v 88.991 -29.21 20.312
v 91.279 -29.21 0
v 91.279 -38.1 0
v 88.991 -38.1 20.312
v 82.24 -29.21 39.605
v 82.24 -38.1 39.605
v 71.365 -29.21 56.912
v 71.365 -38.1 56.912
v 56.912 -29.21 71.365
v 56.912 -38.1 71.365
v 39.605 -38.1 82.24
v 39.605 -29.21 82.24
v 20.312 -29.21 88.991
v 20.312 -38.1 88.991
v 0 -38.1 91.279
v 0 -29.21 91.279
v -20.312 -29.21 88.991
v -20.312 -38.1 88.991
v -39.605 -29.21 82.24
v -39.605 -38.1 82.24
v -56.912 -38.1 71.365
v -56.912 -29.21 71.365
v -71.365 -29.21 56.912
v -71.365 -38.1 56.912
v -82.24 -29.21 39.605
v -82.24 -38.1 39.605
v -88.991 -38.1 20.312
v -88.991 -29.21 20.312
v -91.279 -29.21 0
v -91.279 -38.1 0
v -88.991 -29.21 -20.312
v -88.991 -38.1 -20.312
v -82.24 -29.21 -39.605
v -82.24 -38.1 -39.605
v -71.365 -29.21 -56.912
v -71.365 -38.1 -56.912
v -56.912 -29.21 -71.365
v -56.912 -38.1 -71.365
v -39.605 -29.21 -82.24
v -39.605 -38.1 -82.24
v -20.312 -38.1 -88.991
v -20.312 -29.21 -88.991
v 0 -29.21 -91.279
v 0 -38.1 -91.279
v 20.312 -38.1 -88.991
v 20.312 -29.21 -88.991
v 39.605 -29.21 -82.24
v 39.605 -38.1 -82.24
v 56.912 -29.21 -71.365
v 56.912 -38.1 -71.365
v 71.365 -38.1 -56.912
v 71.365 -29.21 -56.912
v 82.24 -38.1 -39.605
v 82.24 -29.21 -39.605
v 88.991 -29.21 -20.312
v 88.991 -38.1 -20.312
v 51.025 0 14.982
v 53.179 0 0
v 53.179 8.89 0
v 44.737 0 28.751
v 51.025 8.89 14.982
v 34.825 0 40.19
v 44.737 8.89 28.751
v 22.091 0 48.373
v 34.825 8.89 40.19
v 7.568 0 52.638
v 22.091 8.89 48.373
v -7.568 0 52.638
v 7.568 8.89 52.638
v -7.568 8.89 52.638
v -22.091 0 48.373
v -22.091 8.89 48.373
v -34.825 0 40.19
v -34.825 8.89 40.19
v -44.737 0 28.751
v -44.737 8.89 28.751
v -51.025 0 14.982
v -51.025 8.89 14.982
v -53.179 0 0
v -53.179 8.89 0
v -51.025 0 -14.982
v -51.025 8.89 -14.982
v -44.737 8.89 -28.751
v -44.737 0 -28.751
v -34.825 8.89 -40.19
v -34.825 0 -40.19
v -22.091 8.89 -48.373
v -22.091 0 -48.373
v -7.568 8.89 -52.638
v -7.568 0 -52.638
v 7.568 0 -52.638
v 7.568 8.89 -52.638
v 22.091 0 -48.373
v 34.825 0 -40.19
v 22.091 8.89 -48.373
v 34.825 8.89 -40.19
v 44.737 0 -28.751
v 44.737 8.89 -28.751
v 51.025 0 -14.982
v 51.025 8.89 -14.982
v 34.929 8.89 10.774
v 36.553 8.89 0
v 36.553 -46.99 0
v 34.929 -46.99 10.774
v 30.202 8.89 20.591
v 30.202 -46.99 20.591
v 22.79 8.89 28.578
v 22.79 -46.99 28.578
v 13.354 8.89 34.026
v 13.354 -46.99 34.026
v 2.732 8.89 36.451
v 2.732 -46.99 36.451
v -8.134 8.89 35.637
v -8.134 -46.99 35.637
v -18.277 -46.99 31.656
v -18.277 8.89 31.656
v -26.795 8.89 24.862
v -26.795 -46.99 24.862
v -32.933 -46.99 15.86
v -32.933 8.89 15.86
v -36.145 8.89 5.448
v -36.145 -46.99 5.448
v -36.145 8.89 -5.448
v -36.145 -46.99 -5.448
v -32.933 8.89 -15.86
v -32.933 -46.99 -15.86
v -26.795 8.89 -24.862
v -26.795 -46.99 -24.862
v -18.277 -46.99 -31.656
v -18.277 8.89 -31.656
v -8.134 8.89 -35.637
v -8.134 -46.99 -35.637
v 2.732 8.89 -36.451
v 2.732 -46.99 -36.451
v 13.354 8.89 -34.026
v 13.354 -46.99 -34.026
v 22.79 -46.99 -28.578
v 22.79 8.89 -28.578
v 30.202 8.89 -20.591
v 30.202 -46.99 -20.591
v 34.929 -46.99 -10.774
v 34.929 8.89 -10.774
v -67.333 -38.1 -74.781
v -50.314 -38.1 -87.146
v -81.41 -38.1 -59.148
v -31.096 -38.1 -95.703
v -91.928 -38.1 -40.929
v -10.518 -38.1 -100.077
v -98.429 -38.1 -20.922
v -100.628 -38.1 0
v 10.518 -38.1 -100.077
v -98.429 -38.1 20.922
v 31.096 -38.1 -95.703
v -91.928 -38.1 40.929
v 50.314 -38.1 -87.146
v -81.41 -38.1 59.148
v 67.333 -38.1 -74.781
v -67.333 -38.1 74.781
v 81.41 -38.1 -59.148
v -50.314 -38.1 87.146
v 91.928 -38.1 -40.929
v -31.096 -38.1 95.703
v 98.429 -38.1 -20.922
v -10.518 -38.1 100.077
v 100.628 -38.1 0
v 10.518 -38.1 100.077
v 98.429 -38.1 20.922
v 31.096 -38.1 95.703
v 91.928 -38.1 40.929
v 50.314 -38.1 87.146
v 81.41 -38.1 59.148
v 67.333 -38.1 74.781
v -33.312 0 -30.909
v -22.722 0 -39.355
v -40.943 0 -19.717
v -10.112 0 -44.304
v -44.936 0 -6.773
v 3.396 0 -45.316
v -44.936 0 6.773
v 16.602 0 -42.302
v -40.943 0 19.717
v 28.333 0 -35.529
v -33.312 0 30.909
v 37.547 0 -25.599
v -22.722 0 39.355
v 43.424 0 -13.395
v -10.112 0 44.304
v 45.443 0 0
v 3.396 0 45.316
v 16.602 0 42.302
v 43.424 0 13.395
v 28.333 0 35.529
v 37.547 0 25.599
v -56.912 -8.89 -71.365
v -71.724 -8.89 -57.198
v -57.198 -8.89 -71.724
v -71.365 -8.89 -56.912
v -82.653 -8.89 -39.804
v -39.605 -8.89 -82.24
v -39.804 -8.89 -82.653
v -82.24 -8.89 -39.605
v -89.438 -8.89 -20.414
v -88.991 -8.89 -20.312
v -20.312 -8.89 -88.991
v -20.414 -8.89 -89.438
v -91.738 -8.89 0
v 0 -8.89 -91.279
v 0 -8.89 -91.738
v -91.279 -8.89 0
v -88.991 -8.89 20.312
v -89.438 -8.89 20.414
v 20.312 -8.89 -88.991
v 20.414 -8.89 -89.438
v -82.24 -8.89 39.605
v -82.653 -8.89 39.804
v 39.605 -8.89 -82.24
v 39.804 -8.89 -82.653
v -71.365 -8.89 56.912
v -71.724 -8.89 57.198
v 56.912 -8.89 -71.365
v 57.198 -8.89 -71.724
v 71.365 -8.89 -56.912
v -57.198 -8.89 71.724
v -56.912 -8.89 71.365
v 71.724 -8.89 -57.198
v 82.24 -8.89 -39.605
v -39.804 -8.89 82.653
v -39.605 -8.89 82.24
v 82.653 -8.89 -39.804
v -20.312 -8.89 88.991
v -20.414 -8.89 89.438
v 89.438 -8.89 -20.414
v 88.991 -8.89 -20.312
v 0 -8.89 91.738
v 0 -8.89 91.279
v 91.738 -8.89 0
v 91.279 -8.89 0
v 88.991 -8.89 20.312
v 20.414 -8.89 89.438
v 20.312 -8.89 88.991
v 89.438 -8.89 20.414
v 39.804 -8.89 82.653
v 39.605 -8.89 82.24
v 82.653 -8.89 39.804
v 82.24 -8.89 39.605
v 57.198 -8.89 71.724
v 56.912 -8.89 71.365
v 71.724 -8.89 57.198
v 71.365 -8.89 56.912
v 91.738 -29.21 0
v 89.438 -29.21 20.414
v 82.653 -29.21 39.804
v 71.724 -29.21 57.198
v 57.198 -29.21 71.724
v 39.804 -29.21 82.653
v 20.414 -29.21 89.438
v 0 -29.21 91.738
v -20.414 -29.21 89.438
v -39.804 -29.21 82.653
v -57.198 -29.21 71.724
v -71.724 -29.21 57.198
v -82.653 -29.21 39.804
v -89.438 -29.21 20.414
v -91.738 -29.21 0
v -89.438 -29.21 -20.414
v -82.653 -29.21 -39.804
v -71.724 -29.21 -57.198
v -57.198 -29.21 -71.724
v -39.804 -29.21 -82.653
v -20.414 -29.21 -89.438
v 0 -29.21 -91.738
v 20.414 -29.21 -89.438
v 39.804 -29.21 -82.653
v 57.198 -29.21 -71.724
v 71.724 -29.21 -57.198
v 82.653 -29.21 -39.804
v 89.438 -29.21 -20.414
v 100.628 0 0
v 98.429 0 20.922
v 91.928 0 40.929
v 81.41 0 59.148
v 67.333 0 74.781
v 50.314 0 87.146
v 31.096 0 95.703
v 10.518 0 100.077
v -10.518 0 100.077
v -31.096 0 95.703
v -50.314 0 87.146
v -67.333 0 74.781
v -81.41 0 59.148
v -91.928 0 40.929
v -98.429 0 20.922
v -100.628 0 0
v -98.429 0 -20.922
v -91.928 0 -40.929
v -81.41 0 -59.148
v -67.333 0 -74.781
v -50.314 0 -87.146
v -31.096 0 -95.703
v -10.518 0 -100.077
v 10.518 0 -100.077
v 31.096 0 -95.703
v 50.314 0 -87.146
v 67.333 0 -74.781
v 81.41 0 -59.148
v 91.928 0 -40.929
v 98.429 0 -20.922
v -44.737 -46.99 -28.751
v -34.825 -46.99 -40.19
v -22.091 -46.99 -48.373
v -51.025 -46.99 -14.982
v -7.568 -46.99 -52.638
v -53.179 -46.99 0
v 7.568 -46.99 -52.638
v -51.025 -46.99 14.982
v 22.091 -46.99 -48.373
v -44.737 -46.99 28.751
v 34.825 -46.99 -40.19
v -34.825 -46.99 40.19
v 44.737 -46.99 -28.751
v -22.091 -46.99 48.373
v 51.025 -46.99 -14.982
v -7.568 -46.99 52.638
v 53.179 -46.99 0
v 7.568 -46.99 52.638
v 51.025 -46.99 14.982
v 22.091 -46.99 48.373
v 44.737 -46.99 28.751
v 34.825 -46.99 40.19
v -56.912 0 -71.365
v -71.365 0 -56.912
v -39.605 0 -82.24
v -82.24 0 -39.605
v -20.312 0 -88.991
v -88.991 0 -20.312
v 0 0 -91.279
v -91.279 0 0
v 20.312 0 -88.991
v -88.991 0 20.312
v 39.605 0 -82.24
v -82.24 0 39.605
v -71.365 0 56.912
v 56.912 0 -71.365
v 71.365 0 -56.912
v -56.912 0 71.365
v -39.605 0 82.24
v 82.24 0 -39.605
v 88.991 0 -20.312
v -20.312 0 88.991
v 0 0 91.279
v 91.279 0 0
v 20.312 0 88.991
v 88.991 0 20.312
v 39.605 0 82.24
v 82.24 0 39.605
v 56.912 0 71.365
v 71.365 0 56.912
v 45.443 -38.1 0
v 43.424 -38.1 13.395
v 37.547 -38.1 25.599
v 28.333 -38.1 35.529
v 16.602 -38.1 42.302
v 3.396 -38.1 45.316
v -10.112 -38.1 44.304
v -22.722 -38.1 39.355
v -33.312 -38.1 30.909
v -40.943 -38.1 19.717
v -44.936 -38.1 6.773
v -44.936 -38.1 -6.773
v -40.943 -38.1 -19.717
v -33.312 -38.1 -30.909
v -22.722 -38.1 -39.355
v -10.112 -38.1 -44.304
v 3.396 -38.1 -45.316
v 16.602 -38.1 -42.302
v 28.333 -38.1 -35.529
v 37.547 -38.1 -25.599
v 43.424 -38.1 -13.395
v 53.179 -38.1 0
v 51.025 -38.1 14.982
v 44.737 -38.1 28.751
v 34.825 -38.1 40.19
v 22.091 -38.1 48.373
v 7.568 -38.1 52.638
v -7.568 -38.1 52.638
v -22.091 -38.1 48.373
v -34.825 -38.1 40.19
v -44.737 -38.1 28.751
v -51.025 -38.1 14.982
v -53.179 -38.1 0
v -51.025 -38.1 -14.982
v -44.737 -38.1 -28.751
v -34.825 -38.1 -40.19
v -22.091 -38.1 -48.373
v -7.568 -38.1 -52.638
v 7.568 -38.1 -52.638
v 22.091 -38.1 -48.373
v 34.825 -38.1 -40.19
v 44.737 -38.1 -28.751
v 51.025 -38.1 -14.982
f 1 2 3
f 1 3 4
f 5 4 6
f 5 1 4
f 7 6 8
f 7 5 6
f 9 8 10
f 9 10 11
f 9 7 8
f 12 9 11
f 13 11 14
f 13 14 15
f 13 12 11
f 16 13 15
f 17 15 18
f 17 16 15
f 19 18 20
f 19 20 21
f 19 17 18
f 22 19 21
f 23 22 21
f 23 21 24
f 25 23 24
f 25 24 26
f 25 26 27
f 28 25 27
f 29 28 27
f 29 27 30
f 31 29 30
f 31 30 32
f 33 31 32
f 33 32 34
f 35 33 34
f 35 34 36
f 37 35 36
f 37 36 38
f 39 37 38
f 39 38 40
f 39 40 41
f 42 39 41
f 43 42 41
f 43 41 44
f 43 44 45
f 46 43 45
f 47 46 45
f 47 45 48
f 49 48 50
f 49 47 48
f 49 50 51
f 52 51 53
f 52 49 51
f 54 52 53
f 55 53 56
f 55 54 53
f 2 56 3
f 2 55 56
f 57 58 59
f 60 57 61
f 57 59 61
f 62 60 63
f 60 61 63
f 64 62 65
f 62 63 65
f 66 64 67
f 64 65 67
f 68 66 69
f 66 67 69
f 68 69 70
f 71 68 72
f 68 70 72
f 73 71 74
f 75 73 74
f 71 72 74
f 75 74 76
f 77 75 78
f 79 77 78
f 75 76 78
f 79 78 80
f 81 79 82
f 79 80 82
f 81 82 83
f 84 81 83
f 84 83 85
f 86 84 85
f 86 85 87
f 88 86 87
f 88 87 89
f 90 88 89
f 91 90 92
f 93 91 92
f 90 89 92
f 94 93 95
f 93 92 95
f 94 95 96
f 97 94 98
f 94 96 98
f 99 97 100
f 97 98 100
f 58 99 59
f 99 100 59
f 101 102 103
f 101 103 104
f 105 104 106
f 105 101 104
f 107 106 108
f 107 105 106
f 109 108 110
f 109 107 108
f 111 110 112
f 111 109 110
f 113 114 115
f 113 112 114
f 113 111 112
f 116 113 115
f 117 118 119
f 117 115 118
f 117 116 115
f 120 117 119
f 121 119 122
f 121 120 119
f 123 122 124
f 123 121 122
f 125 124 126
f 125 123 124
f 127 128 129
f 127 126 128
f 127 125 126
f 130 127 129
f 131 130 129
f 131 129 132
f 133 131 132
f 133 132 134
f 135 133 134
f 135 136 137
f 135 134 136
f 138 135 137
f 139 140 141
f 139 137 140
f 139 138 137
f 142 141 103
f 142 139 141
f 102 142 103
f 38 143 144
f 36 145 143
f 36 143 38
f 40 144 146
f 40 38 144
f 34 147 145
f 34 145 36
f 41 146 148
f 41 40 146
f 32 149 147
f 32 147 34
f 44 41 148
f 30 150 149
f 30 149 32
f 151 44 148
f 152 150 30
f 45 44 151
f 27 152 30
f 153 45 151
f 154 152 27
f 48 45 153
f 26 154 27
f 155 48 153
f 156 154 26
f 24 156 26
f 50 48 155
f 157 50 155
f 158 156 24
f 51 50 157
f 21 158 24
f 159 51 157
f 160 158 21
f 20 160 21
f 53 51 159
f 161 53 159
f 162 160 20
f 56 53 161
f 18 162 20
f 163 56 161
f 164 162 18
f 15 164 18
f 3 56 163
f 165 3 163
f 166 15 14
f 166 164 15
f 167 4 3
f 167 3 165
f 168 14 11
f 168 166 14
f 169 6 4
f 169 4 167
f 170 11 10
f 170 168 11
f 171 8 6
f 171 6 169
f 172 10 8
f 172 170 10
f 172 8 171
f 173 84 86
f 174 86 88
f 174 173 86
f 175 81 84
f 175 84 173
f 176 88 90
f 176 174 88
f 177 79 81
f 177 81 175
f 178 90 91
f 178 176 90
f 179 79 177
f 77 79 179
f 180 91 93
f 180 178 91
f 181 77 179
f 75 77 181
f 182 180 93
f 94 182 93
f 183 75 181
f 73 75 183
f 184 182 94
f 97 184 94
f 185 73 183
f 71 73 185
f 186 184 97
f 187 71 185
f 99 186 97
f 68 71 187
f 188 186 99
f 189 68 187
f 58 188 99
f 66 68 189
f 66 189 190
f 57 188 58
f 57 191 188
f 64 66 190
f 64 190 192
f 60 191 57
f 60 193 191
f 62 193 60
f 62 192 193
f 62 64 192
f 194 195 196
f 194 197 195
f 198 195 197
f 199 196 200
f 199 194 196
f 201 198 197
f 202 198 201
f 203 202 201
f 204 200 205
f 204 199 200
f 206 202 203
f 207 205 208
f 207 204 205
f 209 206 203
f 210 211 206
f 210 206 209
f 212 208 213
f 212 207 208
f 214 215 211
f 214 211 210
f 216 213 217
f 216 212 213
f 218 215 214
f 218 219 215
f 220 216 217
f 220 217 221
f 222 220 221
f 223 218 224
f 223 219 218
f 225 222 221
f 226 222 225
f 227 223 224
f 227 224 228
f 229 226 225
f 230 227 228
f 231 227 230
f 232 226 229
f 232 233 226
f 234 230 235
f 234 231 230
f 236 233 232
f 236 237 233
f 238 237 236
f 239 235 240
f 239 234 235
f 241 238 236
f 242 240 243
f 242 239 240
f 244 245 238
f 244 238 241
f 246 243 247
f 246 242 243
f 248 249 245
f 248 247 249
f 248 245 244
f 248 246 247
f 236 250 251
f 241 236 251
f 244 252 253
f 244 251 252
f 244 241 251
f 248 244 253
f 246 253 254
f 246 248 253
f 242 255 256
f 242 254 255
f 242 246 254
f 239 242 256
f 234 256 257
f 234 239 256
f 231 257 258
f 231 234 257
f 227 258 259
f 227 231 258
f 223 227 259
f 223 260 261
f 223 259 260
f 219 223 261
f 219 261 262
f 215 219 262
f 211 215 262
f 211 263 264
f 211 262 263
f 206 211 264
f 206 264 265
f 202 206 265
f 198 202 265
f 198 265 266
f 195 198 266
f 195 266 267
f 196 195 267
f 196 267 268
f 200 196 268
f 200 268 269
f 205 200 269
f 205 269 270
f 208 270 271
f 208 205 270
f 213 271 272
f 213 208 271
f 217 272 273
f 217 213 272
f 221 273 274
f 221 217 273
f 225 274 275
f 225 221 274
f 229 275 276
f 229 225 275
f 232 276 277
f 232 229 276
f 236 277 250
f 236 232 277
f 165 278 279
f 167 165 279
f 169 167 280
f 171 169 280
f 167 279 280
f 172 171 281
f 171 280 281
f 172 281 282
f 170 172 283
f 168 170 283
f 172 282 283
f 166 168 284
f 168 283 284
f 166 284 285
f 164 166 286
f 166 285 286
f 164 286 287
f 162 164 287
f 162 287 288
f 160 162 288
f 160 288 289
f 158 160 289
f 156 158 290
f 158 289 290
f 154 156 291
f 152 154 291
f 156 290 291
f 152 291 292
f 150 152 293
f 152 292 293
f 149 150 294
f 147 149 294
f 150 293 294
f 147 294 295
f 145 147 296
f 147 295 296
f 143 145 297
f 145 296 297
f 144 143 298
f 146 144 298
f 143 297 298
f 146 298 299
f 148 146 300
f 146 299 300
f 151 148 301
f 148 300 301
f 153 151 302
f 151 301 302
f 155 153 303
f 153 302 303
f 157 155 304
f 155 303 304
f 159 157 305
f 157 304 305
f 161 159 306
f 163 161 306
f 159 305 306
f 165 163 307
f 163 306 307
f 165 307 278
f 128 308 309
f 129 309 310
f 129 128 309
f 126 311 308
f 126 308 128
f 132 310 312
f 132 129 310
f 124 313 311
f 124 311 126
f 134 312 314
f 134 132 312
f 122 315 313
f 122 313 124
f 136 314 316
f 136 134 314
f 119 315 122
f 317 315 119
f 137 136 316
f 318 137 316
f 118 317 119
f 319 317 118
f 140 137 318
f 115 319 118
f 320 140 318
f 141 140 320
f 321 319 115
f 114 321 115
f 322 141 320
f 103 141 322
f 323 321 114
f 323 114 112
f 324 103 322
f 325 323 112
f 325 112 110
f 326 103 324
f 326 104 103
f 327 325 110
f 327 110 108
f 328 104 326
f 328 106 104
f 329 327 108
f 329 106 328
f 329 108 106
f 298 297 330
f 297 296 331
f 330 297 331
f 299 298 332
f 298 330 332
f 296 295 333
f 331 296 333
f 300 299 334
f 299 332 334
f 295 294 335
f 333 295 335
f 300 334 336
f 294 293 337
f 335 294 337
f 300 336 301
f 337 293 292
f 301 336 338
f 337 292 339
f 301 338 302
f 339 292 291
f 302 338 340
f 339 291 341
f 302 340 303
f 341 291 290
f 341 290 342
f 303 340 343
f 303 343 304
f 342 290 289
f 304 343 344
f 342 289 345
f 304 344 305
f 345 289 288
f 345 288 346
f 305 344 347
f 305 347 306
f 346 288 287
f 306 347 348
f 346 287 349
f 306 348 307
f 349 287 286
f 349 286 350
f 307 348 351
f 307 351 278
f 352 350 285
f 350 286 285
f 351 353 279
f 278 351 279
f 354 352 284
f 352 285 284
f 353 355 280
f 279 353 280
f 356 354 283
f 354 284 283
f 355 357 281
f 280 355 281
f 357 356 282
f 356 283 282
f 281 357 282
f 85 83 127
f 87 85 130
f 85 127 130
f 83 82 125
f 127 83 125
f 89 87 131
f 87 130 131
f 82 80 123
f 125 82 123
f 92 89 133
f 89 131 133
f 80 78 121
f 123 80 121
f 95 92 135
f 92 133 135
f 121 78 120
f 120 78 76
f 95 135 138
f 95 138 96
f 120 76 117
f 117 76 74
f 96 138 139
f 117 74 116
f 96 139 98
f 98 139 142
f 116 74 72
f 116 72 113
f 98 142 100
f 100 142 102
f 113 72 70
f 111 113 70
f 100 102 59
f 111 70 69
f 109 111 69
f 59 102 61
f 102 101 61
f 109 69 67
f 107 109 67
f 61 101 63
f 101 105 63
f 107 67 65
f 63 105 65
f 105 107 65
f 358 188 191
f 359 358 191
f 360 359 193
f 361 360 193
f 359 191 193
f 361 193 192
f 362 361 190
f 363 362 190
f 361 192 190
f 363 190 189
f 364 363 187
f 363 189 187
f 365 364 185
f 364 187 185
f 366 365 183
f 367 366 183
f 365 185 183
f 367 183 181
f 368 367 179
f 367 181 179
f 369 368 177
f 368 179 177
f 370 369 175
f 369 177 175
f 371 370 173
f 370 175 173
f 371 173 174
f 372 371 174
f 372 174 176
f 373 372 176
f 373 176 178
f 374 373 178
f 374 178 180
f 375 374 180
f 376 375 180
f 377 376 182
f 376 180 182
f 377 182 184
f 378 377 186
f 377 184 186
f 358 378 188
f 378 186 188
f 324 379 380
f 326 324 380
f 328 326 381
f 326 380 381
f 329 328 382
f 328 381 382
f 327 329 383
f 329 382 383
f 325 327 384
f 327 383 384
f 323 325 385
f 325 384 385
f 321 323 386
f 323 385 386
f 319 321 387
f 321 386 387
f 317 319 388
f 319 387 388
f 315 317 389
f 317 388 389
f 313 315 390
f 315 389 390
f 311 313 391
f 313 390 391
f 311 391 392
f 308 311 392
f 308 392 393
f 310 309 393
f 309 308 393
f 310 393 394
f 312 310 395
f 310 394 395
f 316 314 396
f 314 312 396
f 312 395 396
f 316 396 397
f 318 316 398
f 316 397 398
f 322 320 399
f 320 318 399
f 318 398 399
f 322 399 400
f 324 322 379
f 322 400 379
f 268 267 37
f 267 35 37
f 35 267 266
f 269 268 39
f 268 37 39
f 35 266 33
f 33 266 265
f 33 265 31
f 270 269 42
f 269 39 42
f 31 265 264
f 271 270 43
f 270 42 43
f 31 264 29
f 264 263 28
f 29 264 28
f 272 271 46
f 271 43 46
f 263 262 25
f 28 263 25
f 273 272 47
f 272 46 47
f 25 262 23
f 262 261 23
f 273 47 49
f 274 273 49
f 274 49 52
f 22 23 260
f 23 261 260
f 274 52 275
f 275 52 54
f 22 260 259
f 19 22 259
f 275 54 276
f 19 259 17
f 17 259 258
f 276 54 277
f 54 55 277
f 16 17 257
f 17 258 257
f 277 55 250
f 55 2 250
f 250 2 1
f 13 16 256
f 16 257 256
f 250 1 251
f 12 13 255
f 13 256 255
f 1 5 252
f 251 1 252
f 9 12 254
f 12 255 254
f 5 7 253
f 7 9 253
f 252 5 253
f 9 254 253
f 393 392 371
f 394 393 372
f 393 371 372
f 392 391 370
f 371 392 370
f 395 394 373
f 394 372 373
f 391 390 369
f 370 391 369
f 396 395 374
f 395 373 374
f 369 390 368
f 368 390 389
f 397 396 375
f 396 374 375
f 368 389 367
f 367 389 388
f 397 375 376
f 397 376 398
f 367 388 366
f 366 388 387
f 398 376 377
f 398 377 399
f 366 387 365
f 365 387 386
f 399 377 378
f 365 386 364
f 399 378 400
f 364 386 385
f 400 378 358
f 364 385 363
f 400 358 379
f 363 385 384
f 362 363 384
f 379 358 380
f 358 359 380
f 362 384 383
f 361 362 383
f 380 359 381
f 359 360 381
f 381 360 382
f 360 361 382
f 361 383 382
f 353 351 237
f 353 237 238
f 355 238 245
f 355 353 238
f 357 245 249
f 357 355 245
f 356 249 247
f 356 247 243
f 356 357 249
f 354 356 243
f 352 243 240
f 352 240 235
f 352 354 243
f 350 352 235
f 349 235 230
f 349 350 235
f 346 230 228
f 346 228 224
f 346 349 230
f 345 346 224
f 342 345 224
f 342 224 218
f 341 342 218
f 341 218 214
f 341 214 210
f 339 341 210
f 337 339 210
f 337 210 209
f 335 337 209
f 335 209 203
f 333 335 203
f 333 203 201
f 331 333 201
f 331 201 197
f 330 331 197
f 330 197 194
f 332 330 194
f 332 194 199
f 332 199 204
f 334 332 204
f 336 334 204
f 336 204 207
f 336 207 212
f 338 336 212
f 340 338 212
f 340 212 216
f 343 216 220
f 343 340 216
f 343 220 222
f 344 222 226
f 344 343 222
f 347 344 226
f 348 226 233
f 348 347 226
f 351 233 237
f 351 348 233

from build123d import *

# Parameters (mm, degrees)
F0_R     = 100.6280045114
F0_R_2   = 91.2790894458
F1_DEPTH = 38.1
F0_R_3   = 53.1790894458
F0_R_4   = 45.4431162604
F2_T     = -8.89
F3_T     = 8.89


with BuildPart() as f1:
    # F0 (on Front) → F1 (new body)
    with BuildSketch(Plane.XZ):
        Circle(F0_R)
        Circle(F0_R_2, mode=Mode.SUBTRACT)
    extrude(amount=F1_DEPTH)

    # F2
    f2_openings = [f1.faces().sort_by_distance(p)[0] for p in [
        (-91.279089, -19.05, 0),
    ]]
    offset(amount=F2_T, openings=f2_openings)


with BuildPart() as f1b:
    # F0 (on Front) → F1, piece 2 (new body)
    with BuildSketch(Plane.XZ):
        Circle(F0_R_3)
        Circle(F0_R_4, mode=Mode.SUBTRACT)
    extrude(amount=F1_DEPTH)

    # F3
    f3_openings = [f1b.faces().sort_by_distance(p)[0] for p in [
        (-53.179089, -19.05, 0),
    ]]
    offset(amount=F3_T, openings=f3_openings, kind=Kind.INTERSECTION)


solid = Compound([f1.part, f1b.part])
